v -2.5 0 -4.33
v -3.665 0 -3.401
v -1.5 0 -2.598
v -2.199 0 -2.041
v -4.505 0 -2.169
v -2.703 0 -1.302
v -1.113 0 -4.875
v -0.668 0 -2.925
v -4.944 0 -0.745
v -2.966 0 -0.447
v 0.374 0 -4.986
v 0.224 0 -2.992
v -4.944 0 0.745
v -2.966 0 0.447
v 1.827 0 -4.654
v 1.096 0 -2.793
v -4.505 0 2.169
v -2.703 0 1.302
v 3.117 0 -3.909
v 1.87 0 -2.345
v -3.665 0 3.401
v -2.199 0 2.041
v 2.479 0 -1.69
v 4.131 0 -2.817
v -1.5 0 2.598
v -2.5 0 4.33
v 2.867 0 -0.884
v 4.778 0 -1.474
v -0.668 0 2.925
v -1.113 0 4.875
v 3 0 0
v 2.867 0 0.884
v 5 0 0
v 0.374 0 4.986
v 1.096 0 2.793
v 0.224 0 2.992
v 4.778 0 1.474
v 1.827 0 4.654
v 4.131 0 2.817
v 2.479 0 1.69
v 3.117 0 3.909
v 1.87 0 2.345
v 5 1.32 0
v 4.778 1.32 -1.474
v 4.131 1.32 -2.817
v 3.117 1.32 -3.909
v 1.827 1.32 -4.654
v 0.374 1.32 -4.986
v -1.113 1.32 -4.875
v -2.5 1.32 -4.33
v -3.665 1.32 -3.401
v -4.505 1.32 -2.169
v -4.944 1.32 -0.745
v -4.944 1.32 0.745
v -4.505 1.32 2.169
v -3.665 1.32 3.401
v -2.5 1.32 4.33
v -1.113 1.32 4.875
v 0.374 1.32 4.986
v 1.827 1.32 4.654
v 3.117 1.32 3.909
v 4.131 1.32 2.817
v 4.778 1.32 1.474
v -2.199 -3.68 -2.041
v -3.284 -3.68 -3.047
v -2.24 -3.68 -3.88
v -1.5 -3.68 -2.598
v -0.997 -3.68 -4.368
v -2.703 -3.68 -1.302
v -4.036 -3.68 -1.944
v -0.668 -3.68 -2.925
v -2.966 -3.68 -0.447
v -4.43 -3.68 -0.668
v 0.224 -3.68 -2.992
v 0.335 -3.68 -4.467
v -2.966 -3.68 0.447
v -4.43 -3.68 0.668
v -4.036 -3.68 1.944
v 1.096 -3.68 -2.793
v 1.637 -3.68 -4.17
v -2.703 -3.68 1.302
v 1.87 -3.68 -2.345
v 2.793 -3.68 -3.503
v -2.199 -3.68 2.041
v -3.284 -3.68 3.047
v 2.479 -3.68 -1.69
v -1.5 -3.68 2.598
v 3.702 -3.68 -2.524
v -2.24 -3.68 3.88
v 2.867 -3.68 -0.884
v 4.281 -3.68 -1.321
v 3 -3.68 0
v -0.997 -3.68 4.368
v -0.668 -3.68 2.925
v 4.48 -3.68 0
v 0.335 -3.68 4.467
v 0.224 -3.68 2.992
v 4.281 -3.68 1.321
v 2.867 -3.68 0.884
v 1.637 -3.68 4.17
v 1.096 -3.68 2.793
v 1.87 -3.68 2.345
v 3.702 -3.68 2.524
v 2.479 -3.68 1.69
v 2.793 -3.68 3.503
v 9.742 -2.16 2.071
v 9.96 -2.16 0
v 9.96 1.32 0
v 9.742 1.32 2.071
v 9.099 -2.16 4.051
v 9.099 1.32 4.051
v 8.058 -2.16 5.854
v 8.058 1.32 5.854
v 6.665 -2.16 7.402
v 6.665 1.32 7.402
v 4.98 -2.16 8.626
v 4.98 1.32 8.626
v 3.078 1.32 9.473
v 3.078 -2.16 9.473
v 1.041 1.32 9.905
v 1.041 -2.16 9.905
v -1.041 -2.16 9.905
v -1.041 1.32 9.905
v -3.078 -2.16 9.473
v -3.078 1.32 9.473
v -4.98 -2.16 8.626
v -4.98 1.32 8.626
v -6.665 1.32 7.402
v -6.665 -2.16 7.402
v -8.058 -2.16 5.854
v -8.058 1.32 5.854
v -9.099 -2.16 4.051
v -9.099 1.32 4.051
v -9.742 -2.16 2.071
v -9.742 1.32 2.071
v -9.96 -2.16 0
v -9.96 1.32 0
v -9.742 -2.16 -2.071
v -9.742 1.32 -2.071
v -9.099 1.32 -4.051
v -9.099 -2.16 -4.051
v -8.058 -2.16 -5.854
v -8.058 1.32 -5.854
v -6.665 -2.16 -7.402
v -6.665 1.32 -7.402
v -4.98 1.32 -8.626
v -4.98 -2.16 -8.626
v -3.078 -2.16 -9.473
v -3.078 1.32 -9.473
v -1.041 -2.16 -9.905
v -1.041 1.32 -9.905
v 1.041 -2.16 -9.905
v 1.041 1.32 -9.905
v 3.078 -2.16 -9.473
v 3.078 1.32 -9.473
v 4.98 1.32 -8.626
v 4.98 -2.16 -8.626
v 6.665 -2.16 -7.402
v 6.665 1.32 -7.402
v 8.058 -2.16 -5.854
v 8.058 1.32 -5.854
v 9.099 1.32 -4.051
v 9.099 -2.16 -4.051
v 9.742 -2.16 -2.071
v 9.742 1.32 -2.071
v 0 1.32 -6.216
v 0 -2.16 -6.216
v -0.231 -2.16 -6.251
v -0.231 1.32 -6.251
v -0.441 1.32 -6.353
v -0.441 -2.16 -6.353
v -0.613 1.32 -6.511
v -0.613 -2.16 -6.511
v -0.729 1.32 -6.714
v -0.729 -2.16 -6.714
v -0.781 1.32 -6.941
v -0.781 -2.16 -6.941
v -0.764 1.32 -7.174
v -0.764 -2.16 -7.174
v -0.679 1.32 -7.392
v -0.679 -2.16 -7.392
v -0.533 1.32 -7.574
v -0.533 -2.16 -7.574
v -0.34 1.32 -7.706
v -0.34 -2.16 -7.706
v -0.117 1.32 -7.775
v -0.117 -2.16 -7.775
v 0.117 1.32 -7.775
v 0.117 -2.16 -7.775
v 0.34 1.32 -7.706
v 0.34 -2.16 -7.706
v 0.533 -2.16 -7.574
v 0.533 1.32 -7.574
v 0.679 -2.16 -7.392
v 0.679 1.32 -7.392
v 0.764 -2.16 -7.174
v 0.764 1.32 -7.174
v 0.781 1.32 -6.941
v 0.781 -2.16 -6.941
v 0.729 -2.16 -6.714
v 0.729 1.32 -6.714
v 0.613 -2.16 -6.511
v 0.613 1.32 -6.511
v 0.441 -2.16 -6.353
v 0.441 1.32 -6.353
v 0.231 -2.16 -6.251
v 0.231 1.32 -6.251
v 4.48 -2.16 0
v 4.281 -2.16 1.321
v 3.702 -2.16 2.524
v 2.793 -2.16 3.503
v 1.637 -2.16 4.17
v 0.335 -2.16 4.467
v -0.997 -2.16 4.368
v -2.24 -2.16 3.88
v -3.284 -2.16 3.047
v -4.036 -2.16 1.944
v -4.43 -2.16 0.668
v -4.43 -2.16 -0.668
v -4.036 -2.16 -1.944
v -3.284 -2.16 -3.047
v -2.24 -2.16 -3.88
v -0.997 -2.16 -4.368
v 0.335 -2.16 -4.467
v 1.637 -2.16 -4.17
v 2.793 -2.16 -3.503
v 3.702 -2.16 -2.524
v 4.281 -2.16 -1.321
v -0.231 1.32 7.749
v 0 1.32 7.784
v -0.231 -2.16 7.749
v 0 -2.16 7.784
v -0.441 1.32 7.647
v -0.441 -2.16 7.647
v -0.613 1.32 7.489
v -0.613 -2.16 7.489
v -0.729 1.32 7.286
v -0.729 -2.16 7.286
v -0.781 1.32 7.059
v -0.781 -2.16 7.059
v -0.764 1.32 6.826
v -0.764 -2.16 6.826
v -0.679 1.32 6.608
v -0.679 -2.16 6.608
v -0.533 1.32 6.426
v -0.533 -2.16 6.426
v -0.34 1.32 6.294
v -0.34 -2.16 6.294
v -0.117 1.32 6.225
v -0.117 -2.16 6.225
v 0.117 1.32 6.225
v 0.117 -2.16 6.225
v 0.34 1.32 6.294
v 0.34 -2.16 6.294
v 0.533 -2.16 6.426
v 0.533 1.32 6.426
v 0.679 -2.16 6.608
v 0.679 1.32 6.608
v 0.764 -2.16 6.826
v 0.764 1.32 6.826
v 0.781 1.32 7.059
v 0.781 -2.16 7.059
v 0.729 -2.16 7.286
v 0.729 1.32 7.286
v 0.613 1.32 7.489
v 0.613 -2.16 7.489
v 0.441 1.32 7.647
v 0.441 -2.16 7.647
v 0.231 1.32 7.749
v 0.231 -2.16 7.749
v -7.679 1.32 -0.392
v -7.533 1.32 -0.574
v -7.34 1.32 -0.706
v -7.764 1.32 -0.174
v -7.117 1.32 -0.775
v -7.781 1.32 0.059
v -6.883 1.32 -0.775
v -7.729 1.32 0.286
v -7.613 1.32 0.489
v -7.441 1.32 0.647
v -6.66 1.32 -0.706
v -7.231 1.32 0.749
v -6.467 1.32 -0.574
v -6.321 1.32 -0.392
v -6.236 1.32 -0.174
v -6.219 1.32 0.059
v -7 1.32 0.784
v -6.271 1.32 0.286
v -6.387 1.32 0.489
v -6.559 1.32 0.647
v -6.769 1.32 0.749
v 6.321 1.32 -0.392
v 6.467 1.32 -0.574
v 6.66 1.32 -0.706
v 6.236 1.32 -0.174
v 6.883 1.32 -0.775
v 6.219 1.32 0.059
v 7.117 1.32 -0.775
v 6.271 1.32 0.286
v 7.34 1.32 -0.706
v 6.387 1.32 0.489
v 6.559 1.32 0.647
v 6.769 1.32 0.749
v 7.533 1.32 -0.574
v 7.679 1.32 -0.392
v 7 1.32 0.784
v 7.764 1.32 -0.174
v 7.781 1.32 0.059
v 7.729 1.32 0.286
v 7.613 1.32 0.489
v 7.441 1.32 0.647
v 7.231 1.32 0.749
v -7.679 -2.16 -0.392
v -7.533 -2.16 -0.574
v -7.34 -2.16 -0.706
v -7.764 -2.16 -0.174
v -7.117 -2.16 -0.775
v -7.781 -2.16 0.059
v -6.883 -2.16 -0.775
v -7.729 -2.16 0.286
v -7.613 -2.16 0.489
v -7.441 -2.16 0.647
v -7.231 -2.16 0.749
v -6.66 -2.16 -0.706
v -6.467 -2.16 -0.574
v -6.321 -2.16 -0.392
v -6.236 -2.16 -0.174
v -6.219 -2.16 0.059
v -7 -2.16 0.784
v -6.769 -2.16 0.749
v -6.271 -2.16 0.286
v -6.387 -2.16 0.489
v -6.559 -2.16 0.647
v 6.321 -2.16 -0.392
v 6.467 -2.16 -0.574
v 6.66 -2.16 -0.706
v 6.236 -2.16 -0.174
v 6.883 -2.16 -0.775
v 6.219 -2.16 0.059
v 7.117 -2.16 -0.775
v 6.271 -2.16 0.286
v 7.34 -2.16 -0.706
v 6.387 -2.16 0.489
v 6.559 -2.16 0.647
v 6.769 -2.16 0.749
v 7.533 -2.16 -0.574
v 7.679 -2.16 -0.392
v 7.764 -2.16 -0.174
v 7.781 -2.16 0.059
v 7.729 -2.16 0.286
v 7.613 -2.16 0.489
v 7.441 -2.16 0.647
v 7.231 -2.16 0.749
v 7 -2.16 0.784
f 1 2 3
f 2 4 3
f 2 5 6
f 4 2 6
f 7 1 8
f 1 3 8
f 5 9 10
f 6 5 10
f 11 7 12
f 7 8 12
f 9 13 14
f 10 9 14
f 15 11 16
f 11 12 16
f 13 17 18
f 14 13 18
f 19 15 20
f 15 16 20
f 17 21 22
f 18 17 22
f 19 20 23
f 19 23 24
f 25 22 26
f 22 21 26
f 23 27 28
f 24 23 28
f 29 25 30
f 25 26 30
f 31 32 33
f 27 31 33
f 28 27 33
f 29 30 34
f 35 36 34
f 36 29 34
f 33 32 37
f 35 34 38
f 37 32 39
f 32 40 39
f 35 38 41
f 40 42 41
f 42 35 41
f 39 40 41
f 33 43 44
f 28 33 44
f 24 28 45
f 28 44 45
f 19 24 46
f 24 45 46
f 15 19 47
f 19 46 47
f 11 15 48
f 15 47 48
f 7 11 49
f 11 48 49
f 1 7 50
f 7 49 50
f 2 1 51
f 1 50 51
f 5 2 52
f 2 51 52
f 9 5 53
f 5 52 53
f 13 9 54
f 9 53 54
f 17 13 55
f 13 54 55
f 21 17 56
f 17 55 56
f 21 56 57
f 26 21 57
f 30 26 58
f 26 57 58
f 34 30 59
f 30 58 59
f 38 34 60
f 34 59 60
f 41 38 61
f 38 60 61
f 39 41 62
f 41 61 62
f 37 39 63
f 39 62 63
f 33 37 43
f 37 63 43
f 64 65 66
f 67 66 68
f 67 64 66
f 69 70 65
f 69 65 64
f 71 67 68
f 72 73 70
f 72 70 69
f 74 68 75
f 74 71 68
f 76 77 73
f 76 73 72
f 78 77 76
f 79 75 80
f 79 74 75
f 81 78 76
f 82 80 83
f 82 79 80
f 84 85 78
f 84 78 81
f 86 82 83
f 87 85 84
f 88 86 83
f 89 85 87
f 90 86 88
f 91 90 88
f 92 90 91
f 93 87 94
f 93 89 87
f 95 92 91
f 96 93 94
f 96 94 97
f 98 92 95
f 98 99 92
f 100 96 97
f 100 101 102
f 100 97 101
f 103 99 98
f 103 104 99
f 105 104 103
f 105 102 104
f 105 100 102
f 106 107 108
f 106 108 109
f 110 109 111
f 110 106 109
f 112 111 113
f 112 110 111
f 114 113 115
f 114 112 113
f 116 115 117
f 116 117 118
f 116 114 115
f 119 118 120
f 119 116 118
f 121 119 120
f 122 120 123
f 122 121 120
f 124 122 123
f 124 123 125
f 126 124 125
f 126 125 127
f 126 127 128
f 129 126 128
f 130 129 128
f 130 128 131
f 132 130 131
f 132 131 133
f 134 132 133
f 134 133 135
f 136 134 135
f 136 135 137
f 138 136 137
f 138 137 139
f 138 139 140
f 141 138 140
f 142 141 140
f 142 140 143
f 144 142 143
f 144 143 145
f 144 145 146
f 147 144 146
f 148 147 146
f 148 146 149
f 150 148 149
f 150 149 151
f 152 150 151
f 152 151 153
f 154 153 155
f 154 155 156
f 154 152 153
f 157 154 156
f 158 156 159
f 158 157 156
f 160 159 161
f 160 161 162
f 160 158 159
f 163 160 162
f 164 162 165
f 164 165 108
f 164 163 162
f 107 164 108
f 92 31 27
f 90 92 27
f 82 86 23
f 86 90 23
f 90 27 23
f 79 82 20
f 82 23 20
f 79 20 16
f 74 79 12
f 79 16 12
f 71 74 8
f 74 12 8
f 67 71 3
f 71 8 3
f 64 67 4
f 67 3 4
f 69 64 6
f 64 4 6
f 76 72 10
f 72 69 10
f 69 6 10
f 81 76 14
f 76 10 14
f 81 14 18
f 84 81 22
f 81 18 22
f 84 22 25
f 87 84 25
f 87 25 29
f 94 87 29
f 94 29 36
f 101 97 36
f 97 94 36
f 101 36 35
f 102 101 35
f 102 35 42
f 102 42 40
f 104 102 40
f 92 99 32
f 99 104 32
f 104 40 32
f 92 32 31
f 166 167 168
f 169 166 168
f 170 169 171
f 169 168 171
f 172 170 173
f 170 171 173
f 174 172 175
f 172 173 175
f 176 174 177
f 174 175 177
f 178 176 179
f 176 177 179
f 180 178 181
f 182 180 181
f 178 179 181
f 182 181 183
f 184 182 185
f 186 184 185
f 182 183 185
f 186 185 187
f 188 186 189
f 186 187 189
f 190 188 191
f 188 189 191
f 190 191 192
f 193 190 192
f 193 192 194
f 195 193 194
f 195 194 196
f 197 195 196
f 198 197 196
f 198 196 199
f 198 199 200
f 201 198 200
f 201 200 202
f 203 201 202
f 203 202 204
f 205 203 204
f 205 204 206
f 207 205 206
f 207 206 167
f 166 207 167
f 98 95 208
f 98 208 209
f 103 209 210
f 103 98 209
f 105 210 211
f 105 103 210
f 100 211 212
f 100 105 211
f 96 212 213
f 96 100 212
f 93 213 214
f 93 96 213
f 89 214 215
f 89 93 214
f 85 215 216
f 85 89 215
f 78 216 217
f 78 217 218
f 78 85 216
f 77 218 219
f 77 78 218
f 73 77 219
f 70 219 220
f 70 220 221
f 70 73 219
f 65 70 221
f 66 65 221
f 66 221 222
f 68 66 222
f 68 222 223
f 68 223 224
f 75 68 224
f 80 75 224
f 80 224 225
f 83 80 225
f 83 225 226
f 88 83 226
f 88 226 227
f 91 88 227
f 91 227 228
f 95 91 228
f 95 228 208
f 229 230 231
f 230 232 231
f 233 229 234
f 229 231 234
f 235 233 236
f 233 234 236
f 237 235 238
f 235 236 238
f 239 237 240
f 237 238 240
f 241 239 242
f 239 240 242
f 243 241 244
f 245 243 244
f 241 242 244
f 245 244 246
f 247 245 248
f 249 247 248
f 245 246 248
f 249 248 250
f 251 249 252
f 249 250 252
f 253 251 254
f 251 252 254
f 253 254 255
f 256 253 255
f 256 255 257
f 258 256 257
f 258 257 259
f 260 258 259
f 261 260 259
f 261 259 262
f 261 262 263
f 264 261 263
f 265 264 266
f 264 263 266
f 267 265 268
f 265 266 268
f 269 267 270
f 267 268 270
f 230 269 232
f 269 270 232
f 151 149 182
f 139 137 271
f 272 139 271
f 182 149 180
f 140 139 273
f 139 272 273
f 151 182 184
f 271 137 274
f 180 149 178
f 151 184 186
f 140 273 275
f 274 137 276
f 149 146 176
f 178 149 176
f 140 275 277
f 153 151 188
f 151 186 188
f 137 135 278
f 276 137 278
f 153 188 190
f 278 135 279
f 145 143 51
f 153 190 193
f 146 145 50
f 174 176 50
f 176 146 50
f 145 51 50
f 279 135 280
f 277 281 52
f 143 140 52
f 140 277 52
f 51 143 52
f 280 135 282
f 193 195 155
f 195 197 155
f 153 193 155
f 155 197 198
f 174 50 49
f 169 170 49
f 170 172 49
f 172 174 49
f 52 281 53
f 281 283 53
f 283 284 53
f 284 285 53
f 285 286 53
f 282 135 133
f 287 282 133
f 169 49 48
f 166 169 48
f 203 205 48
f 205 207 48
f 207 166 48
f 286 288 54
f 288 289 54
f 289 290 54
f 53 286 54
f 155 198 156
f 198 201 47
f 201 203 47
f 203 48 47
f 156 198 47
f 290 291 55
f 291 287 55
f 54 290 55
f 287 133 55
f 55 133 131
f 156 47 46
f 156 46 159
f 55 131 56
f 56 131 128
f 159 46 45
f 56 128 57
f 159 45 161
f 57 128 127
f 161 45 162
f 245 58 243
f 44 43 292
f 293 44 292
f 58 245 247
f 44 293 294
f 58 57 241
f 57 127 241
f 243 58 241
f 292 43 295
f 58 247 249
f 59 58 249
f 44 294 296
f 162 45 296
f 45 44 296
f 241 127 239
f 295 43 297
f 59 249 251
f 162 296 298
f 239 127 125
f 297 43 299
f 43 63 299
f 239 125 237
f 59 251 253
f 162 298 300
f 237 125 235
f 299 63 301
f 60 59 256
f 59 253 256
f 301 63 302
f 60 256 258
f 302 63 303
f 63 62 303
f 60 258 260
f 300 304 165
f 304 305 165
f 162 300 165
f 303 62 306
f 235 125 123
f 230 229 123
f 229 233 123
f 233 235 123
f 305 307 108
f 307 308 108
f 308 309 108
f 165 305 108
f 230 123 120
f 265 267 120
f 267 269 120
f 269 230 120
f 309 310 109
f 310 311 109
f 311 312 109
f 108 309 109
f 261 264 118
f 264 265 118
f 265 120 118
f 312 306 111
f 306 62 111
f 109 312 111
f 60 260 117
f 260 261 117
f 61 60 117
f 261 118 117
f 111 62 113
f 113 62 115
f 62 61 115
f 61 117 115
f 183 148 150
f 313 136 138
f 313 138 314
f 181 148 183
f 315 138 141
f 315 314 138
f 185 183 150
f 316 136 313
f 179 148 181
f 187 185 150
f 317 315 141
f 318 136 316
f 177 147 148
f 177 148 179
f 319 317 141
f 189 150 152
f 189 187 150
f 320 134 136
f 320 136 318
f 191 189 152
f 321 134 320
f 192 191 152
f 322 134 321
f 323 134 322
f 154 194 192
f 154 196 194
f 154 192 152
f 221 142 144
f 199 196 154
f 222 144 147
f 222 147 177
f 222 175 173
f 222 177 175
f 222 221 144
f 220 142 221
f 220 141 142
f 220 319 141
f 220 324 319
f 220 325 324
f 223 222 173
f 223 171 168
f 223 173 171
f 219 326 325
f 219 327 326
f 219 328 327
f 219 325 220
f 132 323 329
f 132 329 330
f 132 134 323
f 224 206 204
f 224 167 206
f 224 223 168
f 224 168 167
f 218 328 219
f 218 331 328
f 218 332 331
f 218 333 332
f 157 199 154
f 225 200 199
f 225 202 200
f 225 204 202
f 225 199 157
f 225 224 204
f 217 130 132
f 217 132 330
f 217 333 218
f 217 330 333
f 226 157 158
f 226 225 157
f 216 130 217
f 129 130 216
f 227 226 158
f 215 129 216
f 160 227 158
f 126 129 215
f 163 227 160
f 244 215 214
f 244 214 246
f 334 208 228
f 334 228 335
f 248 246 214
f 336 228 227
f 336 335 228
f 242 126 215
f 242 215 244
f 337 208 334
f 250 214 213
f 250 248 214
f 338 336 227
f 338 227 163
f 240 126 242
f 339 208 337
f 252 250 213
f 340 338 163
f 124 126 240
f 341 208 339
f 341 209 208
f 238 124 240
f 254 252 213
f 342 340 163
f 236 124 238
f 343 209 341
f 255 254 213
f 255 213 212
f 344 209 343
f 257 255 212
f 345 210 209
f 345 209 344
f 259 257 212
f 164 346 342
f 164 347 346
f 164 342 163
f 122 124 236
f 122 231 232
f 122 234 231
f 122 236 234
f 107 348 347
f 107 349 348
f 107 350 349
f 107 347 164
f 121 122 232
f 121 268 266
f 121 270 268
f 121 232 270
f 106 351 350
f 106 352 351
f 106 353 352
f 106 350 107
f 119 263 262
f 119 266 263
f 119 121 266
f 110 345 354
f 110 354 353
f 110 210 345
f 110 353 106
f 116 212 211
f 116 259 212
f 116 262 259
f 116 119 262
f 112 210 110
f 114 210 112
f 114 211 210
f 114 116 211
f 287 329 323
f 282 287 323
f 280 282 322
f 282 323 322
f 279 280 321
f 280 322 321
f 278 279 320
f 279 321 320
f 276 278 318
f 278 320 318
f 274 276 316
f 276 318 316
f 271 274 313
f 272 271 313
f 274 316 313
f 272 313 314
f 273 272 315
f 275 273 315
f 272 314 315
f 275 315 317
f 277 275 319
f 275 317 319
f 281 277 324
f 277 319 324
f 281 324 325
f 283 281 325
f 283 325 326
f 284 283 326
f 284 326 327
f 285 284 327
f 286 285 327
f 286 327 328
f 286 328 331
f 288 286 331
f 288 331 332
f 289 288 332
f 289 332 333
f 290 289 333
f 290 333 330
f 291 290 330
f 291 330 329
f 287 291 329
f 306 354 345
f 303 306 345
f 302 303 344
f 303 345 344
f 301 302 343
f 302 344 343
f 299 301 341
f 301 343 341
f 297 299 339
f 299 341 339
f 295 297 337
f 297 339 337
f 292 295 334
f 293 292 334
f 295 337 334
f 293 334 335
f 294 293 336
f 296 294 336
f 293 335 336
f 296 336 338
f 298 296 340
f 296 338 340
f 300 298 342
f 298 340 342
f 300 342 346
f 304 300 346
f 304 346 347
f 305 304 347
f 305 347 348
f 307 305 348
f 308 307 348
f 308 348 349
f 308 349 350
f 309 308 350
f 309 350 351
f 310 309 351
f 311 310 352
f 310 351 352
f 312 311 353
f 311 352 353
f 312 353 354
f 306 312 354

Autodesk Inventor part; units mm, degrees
ref_plane "YZ Plane" through (0, 0, 0) normal (1, 0, 0) x (0, 1, 0)
ref_plane "XZ Plane" through (0, 0, 0) normal (0, 1, 0) x (-1, 0, 0)
ref_plane "XY Plane" through (0, 0, 0) normal (0, 0, 1) x (1, 0, 0)
sketch "스케치1" plane through (0, 0, 0) normal (0, 0, 1) x (1, 0, 0)
  line L0 (0, 6.4532) -> (0, -6.4532)
  line L1 (3, -3.68) -> (3, 0)
  line L2 (3, 0) -> (5, 0)
  line L3 (5, 0) -> (5, 1.32)
  line L4 (5, 1.32) -> (9.96, 1.32)
  line L5 (9.96, 1.32) -> (9.96, -2.16)
  line L6 (9.96, -2.16) -> (4.48, -2.16)
  line L7 (4.48, -2.16) -> (4.48, -3.68)
  line L8 (4.48, -3.68) -> (3, -3.68)
  point P0 (0, 0)
  point P1 (0, 0)
  dimension "d22" = 6
  dimension "d23" = 8.96
  dimension "d24" = 10
  dimension "d25" = 19.92
  dimension "d26" = 1.32
  dimension "d27" = 5
  dimension "d28" = 3.48
revolve "회전1" add sketch "스케치1" angle 360 about axis through (0, 6.4532, 0) along (0, -1, 0)
sketch "Sketch3" plane through (0, 1.32, 0) normal (0, 1, 0) x (1, 0, 0)
  point P0 (0, 0)
  point P1 (7, 0)
  point P2 (0, 7)
  point P3 (-7, 0)
  point P4 (0, -7)
  dimension "d29" = 7
  dimension "d32" = 360
hole "Hole2" at (7, 1.32, 0) at (0, 1.32, -7) at (-7, 1.32, 0) at (0, 1.32, 7) direction (0, -1, 0) diameter 1.567 end through all thread size "M2x0.4" class "6H" standard "ISO Metric profile"
properties part number "Bottom Horn" material "Aluminum 6061-AHC"
